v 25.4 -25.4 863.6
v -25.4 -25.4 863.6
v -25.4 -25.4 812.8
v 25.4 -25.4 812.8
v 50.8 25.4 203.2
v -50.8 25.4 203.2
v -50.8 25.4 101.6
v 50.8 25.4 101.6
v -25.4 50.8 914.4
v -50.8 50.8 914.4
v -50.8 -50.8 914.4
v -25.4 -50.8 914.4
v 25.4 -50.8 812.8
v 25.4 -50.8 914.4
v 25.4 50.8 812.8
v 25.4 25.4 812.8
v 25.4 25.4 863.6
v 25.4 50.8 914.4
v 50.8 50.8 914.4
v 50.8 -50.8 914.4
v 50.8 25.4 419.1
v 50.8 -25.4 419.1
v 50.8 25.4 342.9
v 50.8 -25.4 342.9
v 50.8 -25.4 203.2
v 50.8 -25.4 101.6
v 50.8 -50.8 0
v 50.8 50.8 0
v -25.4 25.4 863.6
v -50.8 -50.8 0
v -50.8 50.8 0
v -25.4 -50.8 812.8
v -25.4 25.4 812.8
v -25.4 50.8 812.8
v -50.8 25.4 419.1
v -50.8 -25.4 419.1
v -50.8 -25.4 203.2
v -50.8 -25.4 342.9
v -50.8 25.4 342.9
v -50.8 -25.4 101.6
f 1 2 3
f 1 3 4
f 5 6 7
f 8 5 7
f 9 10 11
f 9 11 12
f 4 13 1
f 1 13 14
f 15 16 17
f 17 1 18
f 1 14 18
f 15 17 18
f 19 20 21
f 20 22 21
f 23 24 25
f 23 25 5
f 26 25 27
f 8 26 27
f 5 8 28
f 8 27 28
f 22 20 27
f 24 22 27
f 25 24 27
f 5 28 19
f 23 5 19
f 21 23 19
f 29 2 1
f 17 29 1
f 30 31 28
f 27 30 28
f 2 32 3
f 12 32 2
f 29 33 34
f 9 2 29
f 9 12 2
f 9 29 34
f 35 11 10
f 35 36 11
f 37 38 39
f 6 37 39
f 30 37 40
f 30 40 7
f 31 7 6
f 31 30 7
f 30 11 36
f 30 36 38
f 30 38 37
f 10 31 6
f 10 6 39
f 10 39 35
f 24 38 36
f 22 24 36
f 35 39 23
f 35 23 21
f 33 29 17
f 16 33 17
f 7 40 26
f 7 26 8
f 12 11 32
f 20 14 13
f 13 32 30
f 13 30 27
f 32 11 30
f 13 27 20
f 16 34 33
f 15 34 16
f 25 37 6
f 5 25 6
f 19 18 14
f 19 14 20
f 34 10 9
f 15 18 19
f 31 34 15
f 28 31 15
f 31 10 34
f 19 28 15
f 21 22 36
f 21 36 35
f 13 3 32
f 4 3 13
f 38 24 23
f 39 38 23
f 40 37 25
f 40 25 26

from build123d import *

# Parameters (mm, degrees)
SKETCH1_W               = 101.6
SKETCH1_H               = 101.6
BOSS_EXTRUDE1_DEPTH     = 914.4
CUT_EXTRUDE1_DEPTH      = 922.428543079
CUT_EXTRUDE1_DEPTH_BACK = 922.428543079
SKETCH2_W               = 101.6
SKETCH2_H               = 50.8
SKETCH3_W               = 50.8
SKETCH3_H               = 101.6
CUT_EXTRUDE2_DEPTH      = 50.8
SKETCH4_W               = 50.8
SKETCH4_H               = 25.4
CUT_EXTRUDE3_DEPTH      = 50.8
SKETCH5_W               = 76.2
SKETCH5_H               = 50.8
CUT_EXTRUDE4_DEPTH      = 922.428543079


with BuildPart() as part:
    # Sketch1 → Boss-Extrude1 (new body)
    with BuildSketch(Plane.XY):
        Rectangle(SKETCH1_W, SKETCH1_H)
    extrude(amount=BOSS_EXTRUDE1_DEPTH)

    # Sketch2 → Cut-Extrude1 (cut, two sides: drawn at the far end of the back side and taken through both)
    with BuildSketch(Plane(origin=(50.8, 0, 0), x_dir=(0, 0, -1), z_dir=(1, 0, 0)).offset(-CUT_EXTRUDE1_DEPTH_BACK)):
        with Locations((-152.4, 0)):
            Rectangle(SKETCH2_W, SKETCH2_H)
    extrude(amount=CUT_EXTRUDE1_DEPTH + CUT_EXTRUDE1_DEPTH_BACK, mode=Mode.SUBTRACT)

    # Sketch3 → Cut-Extrude2 (cut)
    with BuildSketch(Plane.XY.offset(914.4)):
        Rectangle(SKETCH3_W, SKETCH3_H)
    extrude(amount=-CUT_EXTRUDE2_DEPTH, mode=Mode.SUBTRACT)

    # Sketch4 → Cut-Extrude3 (cut)
    with BuildSketch(Plane.XY.offset(863.6)):
        with Locations((0, 38.1)):
            Rectangle(SKETCH4_W, SKETCH4_H)
        with Locations((0, -38.1)):
            Rectangle(SKETCH4_W, SKETCH4_H)
    extrude(amount=-CUT_EXTRUDE3_DEPTH, mode=Mode.SUBTRACT)

    # Sketch5 → Cut-Extrude4 (cut, through all)
    with BuildSketch(Plane.ZY.offset(50.8)):
        with Locations((381, 0)):
            Rectangle(SKETCH5_W, SKETCH5_H)
    extrude(amount=-CUT_EXTRUDE4_DEPTH, mode=Mode.SUBTRACT)


solid = part.part
